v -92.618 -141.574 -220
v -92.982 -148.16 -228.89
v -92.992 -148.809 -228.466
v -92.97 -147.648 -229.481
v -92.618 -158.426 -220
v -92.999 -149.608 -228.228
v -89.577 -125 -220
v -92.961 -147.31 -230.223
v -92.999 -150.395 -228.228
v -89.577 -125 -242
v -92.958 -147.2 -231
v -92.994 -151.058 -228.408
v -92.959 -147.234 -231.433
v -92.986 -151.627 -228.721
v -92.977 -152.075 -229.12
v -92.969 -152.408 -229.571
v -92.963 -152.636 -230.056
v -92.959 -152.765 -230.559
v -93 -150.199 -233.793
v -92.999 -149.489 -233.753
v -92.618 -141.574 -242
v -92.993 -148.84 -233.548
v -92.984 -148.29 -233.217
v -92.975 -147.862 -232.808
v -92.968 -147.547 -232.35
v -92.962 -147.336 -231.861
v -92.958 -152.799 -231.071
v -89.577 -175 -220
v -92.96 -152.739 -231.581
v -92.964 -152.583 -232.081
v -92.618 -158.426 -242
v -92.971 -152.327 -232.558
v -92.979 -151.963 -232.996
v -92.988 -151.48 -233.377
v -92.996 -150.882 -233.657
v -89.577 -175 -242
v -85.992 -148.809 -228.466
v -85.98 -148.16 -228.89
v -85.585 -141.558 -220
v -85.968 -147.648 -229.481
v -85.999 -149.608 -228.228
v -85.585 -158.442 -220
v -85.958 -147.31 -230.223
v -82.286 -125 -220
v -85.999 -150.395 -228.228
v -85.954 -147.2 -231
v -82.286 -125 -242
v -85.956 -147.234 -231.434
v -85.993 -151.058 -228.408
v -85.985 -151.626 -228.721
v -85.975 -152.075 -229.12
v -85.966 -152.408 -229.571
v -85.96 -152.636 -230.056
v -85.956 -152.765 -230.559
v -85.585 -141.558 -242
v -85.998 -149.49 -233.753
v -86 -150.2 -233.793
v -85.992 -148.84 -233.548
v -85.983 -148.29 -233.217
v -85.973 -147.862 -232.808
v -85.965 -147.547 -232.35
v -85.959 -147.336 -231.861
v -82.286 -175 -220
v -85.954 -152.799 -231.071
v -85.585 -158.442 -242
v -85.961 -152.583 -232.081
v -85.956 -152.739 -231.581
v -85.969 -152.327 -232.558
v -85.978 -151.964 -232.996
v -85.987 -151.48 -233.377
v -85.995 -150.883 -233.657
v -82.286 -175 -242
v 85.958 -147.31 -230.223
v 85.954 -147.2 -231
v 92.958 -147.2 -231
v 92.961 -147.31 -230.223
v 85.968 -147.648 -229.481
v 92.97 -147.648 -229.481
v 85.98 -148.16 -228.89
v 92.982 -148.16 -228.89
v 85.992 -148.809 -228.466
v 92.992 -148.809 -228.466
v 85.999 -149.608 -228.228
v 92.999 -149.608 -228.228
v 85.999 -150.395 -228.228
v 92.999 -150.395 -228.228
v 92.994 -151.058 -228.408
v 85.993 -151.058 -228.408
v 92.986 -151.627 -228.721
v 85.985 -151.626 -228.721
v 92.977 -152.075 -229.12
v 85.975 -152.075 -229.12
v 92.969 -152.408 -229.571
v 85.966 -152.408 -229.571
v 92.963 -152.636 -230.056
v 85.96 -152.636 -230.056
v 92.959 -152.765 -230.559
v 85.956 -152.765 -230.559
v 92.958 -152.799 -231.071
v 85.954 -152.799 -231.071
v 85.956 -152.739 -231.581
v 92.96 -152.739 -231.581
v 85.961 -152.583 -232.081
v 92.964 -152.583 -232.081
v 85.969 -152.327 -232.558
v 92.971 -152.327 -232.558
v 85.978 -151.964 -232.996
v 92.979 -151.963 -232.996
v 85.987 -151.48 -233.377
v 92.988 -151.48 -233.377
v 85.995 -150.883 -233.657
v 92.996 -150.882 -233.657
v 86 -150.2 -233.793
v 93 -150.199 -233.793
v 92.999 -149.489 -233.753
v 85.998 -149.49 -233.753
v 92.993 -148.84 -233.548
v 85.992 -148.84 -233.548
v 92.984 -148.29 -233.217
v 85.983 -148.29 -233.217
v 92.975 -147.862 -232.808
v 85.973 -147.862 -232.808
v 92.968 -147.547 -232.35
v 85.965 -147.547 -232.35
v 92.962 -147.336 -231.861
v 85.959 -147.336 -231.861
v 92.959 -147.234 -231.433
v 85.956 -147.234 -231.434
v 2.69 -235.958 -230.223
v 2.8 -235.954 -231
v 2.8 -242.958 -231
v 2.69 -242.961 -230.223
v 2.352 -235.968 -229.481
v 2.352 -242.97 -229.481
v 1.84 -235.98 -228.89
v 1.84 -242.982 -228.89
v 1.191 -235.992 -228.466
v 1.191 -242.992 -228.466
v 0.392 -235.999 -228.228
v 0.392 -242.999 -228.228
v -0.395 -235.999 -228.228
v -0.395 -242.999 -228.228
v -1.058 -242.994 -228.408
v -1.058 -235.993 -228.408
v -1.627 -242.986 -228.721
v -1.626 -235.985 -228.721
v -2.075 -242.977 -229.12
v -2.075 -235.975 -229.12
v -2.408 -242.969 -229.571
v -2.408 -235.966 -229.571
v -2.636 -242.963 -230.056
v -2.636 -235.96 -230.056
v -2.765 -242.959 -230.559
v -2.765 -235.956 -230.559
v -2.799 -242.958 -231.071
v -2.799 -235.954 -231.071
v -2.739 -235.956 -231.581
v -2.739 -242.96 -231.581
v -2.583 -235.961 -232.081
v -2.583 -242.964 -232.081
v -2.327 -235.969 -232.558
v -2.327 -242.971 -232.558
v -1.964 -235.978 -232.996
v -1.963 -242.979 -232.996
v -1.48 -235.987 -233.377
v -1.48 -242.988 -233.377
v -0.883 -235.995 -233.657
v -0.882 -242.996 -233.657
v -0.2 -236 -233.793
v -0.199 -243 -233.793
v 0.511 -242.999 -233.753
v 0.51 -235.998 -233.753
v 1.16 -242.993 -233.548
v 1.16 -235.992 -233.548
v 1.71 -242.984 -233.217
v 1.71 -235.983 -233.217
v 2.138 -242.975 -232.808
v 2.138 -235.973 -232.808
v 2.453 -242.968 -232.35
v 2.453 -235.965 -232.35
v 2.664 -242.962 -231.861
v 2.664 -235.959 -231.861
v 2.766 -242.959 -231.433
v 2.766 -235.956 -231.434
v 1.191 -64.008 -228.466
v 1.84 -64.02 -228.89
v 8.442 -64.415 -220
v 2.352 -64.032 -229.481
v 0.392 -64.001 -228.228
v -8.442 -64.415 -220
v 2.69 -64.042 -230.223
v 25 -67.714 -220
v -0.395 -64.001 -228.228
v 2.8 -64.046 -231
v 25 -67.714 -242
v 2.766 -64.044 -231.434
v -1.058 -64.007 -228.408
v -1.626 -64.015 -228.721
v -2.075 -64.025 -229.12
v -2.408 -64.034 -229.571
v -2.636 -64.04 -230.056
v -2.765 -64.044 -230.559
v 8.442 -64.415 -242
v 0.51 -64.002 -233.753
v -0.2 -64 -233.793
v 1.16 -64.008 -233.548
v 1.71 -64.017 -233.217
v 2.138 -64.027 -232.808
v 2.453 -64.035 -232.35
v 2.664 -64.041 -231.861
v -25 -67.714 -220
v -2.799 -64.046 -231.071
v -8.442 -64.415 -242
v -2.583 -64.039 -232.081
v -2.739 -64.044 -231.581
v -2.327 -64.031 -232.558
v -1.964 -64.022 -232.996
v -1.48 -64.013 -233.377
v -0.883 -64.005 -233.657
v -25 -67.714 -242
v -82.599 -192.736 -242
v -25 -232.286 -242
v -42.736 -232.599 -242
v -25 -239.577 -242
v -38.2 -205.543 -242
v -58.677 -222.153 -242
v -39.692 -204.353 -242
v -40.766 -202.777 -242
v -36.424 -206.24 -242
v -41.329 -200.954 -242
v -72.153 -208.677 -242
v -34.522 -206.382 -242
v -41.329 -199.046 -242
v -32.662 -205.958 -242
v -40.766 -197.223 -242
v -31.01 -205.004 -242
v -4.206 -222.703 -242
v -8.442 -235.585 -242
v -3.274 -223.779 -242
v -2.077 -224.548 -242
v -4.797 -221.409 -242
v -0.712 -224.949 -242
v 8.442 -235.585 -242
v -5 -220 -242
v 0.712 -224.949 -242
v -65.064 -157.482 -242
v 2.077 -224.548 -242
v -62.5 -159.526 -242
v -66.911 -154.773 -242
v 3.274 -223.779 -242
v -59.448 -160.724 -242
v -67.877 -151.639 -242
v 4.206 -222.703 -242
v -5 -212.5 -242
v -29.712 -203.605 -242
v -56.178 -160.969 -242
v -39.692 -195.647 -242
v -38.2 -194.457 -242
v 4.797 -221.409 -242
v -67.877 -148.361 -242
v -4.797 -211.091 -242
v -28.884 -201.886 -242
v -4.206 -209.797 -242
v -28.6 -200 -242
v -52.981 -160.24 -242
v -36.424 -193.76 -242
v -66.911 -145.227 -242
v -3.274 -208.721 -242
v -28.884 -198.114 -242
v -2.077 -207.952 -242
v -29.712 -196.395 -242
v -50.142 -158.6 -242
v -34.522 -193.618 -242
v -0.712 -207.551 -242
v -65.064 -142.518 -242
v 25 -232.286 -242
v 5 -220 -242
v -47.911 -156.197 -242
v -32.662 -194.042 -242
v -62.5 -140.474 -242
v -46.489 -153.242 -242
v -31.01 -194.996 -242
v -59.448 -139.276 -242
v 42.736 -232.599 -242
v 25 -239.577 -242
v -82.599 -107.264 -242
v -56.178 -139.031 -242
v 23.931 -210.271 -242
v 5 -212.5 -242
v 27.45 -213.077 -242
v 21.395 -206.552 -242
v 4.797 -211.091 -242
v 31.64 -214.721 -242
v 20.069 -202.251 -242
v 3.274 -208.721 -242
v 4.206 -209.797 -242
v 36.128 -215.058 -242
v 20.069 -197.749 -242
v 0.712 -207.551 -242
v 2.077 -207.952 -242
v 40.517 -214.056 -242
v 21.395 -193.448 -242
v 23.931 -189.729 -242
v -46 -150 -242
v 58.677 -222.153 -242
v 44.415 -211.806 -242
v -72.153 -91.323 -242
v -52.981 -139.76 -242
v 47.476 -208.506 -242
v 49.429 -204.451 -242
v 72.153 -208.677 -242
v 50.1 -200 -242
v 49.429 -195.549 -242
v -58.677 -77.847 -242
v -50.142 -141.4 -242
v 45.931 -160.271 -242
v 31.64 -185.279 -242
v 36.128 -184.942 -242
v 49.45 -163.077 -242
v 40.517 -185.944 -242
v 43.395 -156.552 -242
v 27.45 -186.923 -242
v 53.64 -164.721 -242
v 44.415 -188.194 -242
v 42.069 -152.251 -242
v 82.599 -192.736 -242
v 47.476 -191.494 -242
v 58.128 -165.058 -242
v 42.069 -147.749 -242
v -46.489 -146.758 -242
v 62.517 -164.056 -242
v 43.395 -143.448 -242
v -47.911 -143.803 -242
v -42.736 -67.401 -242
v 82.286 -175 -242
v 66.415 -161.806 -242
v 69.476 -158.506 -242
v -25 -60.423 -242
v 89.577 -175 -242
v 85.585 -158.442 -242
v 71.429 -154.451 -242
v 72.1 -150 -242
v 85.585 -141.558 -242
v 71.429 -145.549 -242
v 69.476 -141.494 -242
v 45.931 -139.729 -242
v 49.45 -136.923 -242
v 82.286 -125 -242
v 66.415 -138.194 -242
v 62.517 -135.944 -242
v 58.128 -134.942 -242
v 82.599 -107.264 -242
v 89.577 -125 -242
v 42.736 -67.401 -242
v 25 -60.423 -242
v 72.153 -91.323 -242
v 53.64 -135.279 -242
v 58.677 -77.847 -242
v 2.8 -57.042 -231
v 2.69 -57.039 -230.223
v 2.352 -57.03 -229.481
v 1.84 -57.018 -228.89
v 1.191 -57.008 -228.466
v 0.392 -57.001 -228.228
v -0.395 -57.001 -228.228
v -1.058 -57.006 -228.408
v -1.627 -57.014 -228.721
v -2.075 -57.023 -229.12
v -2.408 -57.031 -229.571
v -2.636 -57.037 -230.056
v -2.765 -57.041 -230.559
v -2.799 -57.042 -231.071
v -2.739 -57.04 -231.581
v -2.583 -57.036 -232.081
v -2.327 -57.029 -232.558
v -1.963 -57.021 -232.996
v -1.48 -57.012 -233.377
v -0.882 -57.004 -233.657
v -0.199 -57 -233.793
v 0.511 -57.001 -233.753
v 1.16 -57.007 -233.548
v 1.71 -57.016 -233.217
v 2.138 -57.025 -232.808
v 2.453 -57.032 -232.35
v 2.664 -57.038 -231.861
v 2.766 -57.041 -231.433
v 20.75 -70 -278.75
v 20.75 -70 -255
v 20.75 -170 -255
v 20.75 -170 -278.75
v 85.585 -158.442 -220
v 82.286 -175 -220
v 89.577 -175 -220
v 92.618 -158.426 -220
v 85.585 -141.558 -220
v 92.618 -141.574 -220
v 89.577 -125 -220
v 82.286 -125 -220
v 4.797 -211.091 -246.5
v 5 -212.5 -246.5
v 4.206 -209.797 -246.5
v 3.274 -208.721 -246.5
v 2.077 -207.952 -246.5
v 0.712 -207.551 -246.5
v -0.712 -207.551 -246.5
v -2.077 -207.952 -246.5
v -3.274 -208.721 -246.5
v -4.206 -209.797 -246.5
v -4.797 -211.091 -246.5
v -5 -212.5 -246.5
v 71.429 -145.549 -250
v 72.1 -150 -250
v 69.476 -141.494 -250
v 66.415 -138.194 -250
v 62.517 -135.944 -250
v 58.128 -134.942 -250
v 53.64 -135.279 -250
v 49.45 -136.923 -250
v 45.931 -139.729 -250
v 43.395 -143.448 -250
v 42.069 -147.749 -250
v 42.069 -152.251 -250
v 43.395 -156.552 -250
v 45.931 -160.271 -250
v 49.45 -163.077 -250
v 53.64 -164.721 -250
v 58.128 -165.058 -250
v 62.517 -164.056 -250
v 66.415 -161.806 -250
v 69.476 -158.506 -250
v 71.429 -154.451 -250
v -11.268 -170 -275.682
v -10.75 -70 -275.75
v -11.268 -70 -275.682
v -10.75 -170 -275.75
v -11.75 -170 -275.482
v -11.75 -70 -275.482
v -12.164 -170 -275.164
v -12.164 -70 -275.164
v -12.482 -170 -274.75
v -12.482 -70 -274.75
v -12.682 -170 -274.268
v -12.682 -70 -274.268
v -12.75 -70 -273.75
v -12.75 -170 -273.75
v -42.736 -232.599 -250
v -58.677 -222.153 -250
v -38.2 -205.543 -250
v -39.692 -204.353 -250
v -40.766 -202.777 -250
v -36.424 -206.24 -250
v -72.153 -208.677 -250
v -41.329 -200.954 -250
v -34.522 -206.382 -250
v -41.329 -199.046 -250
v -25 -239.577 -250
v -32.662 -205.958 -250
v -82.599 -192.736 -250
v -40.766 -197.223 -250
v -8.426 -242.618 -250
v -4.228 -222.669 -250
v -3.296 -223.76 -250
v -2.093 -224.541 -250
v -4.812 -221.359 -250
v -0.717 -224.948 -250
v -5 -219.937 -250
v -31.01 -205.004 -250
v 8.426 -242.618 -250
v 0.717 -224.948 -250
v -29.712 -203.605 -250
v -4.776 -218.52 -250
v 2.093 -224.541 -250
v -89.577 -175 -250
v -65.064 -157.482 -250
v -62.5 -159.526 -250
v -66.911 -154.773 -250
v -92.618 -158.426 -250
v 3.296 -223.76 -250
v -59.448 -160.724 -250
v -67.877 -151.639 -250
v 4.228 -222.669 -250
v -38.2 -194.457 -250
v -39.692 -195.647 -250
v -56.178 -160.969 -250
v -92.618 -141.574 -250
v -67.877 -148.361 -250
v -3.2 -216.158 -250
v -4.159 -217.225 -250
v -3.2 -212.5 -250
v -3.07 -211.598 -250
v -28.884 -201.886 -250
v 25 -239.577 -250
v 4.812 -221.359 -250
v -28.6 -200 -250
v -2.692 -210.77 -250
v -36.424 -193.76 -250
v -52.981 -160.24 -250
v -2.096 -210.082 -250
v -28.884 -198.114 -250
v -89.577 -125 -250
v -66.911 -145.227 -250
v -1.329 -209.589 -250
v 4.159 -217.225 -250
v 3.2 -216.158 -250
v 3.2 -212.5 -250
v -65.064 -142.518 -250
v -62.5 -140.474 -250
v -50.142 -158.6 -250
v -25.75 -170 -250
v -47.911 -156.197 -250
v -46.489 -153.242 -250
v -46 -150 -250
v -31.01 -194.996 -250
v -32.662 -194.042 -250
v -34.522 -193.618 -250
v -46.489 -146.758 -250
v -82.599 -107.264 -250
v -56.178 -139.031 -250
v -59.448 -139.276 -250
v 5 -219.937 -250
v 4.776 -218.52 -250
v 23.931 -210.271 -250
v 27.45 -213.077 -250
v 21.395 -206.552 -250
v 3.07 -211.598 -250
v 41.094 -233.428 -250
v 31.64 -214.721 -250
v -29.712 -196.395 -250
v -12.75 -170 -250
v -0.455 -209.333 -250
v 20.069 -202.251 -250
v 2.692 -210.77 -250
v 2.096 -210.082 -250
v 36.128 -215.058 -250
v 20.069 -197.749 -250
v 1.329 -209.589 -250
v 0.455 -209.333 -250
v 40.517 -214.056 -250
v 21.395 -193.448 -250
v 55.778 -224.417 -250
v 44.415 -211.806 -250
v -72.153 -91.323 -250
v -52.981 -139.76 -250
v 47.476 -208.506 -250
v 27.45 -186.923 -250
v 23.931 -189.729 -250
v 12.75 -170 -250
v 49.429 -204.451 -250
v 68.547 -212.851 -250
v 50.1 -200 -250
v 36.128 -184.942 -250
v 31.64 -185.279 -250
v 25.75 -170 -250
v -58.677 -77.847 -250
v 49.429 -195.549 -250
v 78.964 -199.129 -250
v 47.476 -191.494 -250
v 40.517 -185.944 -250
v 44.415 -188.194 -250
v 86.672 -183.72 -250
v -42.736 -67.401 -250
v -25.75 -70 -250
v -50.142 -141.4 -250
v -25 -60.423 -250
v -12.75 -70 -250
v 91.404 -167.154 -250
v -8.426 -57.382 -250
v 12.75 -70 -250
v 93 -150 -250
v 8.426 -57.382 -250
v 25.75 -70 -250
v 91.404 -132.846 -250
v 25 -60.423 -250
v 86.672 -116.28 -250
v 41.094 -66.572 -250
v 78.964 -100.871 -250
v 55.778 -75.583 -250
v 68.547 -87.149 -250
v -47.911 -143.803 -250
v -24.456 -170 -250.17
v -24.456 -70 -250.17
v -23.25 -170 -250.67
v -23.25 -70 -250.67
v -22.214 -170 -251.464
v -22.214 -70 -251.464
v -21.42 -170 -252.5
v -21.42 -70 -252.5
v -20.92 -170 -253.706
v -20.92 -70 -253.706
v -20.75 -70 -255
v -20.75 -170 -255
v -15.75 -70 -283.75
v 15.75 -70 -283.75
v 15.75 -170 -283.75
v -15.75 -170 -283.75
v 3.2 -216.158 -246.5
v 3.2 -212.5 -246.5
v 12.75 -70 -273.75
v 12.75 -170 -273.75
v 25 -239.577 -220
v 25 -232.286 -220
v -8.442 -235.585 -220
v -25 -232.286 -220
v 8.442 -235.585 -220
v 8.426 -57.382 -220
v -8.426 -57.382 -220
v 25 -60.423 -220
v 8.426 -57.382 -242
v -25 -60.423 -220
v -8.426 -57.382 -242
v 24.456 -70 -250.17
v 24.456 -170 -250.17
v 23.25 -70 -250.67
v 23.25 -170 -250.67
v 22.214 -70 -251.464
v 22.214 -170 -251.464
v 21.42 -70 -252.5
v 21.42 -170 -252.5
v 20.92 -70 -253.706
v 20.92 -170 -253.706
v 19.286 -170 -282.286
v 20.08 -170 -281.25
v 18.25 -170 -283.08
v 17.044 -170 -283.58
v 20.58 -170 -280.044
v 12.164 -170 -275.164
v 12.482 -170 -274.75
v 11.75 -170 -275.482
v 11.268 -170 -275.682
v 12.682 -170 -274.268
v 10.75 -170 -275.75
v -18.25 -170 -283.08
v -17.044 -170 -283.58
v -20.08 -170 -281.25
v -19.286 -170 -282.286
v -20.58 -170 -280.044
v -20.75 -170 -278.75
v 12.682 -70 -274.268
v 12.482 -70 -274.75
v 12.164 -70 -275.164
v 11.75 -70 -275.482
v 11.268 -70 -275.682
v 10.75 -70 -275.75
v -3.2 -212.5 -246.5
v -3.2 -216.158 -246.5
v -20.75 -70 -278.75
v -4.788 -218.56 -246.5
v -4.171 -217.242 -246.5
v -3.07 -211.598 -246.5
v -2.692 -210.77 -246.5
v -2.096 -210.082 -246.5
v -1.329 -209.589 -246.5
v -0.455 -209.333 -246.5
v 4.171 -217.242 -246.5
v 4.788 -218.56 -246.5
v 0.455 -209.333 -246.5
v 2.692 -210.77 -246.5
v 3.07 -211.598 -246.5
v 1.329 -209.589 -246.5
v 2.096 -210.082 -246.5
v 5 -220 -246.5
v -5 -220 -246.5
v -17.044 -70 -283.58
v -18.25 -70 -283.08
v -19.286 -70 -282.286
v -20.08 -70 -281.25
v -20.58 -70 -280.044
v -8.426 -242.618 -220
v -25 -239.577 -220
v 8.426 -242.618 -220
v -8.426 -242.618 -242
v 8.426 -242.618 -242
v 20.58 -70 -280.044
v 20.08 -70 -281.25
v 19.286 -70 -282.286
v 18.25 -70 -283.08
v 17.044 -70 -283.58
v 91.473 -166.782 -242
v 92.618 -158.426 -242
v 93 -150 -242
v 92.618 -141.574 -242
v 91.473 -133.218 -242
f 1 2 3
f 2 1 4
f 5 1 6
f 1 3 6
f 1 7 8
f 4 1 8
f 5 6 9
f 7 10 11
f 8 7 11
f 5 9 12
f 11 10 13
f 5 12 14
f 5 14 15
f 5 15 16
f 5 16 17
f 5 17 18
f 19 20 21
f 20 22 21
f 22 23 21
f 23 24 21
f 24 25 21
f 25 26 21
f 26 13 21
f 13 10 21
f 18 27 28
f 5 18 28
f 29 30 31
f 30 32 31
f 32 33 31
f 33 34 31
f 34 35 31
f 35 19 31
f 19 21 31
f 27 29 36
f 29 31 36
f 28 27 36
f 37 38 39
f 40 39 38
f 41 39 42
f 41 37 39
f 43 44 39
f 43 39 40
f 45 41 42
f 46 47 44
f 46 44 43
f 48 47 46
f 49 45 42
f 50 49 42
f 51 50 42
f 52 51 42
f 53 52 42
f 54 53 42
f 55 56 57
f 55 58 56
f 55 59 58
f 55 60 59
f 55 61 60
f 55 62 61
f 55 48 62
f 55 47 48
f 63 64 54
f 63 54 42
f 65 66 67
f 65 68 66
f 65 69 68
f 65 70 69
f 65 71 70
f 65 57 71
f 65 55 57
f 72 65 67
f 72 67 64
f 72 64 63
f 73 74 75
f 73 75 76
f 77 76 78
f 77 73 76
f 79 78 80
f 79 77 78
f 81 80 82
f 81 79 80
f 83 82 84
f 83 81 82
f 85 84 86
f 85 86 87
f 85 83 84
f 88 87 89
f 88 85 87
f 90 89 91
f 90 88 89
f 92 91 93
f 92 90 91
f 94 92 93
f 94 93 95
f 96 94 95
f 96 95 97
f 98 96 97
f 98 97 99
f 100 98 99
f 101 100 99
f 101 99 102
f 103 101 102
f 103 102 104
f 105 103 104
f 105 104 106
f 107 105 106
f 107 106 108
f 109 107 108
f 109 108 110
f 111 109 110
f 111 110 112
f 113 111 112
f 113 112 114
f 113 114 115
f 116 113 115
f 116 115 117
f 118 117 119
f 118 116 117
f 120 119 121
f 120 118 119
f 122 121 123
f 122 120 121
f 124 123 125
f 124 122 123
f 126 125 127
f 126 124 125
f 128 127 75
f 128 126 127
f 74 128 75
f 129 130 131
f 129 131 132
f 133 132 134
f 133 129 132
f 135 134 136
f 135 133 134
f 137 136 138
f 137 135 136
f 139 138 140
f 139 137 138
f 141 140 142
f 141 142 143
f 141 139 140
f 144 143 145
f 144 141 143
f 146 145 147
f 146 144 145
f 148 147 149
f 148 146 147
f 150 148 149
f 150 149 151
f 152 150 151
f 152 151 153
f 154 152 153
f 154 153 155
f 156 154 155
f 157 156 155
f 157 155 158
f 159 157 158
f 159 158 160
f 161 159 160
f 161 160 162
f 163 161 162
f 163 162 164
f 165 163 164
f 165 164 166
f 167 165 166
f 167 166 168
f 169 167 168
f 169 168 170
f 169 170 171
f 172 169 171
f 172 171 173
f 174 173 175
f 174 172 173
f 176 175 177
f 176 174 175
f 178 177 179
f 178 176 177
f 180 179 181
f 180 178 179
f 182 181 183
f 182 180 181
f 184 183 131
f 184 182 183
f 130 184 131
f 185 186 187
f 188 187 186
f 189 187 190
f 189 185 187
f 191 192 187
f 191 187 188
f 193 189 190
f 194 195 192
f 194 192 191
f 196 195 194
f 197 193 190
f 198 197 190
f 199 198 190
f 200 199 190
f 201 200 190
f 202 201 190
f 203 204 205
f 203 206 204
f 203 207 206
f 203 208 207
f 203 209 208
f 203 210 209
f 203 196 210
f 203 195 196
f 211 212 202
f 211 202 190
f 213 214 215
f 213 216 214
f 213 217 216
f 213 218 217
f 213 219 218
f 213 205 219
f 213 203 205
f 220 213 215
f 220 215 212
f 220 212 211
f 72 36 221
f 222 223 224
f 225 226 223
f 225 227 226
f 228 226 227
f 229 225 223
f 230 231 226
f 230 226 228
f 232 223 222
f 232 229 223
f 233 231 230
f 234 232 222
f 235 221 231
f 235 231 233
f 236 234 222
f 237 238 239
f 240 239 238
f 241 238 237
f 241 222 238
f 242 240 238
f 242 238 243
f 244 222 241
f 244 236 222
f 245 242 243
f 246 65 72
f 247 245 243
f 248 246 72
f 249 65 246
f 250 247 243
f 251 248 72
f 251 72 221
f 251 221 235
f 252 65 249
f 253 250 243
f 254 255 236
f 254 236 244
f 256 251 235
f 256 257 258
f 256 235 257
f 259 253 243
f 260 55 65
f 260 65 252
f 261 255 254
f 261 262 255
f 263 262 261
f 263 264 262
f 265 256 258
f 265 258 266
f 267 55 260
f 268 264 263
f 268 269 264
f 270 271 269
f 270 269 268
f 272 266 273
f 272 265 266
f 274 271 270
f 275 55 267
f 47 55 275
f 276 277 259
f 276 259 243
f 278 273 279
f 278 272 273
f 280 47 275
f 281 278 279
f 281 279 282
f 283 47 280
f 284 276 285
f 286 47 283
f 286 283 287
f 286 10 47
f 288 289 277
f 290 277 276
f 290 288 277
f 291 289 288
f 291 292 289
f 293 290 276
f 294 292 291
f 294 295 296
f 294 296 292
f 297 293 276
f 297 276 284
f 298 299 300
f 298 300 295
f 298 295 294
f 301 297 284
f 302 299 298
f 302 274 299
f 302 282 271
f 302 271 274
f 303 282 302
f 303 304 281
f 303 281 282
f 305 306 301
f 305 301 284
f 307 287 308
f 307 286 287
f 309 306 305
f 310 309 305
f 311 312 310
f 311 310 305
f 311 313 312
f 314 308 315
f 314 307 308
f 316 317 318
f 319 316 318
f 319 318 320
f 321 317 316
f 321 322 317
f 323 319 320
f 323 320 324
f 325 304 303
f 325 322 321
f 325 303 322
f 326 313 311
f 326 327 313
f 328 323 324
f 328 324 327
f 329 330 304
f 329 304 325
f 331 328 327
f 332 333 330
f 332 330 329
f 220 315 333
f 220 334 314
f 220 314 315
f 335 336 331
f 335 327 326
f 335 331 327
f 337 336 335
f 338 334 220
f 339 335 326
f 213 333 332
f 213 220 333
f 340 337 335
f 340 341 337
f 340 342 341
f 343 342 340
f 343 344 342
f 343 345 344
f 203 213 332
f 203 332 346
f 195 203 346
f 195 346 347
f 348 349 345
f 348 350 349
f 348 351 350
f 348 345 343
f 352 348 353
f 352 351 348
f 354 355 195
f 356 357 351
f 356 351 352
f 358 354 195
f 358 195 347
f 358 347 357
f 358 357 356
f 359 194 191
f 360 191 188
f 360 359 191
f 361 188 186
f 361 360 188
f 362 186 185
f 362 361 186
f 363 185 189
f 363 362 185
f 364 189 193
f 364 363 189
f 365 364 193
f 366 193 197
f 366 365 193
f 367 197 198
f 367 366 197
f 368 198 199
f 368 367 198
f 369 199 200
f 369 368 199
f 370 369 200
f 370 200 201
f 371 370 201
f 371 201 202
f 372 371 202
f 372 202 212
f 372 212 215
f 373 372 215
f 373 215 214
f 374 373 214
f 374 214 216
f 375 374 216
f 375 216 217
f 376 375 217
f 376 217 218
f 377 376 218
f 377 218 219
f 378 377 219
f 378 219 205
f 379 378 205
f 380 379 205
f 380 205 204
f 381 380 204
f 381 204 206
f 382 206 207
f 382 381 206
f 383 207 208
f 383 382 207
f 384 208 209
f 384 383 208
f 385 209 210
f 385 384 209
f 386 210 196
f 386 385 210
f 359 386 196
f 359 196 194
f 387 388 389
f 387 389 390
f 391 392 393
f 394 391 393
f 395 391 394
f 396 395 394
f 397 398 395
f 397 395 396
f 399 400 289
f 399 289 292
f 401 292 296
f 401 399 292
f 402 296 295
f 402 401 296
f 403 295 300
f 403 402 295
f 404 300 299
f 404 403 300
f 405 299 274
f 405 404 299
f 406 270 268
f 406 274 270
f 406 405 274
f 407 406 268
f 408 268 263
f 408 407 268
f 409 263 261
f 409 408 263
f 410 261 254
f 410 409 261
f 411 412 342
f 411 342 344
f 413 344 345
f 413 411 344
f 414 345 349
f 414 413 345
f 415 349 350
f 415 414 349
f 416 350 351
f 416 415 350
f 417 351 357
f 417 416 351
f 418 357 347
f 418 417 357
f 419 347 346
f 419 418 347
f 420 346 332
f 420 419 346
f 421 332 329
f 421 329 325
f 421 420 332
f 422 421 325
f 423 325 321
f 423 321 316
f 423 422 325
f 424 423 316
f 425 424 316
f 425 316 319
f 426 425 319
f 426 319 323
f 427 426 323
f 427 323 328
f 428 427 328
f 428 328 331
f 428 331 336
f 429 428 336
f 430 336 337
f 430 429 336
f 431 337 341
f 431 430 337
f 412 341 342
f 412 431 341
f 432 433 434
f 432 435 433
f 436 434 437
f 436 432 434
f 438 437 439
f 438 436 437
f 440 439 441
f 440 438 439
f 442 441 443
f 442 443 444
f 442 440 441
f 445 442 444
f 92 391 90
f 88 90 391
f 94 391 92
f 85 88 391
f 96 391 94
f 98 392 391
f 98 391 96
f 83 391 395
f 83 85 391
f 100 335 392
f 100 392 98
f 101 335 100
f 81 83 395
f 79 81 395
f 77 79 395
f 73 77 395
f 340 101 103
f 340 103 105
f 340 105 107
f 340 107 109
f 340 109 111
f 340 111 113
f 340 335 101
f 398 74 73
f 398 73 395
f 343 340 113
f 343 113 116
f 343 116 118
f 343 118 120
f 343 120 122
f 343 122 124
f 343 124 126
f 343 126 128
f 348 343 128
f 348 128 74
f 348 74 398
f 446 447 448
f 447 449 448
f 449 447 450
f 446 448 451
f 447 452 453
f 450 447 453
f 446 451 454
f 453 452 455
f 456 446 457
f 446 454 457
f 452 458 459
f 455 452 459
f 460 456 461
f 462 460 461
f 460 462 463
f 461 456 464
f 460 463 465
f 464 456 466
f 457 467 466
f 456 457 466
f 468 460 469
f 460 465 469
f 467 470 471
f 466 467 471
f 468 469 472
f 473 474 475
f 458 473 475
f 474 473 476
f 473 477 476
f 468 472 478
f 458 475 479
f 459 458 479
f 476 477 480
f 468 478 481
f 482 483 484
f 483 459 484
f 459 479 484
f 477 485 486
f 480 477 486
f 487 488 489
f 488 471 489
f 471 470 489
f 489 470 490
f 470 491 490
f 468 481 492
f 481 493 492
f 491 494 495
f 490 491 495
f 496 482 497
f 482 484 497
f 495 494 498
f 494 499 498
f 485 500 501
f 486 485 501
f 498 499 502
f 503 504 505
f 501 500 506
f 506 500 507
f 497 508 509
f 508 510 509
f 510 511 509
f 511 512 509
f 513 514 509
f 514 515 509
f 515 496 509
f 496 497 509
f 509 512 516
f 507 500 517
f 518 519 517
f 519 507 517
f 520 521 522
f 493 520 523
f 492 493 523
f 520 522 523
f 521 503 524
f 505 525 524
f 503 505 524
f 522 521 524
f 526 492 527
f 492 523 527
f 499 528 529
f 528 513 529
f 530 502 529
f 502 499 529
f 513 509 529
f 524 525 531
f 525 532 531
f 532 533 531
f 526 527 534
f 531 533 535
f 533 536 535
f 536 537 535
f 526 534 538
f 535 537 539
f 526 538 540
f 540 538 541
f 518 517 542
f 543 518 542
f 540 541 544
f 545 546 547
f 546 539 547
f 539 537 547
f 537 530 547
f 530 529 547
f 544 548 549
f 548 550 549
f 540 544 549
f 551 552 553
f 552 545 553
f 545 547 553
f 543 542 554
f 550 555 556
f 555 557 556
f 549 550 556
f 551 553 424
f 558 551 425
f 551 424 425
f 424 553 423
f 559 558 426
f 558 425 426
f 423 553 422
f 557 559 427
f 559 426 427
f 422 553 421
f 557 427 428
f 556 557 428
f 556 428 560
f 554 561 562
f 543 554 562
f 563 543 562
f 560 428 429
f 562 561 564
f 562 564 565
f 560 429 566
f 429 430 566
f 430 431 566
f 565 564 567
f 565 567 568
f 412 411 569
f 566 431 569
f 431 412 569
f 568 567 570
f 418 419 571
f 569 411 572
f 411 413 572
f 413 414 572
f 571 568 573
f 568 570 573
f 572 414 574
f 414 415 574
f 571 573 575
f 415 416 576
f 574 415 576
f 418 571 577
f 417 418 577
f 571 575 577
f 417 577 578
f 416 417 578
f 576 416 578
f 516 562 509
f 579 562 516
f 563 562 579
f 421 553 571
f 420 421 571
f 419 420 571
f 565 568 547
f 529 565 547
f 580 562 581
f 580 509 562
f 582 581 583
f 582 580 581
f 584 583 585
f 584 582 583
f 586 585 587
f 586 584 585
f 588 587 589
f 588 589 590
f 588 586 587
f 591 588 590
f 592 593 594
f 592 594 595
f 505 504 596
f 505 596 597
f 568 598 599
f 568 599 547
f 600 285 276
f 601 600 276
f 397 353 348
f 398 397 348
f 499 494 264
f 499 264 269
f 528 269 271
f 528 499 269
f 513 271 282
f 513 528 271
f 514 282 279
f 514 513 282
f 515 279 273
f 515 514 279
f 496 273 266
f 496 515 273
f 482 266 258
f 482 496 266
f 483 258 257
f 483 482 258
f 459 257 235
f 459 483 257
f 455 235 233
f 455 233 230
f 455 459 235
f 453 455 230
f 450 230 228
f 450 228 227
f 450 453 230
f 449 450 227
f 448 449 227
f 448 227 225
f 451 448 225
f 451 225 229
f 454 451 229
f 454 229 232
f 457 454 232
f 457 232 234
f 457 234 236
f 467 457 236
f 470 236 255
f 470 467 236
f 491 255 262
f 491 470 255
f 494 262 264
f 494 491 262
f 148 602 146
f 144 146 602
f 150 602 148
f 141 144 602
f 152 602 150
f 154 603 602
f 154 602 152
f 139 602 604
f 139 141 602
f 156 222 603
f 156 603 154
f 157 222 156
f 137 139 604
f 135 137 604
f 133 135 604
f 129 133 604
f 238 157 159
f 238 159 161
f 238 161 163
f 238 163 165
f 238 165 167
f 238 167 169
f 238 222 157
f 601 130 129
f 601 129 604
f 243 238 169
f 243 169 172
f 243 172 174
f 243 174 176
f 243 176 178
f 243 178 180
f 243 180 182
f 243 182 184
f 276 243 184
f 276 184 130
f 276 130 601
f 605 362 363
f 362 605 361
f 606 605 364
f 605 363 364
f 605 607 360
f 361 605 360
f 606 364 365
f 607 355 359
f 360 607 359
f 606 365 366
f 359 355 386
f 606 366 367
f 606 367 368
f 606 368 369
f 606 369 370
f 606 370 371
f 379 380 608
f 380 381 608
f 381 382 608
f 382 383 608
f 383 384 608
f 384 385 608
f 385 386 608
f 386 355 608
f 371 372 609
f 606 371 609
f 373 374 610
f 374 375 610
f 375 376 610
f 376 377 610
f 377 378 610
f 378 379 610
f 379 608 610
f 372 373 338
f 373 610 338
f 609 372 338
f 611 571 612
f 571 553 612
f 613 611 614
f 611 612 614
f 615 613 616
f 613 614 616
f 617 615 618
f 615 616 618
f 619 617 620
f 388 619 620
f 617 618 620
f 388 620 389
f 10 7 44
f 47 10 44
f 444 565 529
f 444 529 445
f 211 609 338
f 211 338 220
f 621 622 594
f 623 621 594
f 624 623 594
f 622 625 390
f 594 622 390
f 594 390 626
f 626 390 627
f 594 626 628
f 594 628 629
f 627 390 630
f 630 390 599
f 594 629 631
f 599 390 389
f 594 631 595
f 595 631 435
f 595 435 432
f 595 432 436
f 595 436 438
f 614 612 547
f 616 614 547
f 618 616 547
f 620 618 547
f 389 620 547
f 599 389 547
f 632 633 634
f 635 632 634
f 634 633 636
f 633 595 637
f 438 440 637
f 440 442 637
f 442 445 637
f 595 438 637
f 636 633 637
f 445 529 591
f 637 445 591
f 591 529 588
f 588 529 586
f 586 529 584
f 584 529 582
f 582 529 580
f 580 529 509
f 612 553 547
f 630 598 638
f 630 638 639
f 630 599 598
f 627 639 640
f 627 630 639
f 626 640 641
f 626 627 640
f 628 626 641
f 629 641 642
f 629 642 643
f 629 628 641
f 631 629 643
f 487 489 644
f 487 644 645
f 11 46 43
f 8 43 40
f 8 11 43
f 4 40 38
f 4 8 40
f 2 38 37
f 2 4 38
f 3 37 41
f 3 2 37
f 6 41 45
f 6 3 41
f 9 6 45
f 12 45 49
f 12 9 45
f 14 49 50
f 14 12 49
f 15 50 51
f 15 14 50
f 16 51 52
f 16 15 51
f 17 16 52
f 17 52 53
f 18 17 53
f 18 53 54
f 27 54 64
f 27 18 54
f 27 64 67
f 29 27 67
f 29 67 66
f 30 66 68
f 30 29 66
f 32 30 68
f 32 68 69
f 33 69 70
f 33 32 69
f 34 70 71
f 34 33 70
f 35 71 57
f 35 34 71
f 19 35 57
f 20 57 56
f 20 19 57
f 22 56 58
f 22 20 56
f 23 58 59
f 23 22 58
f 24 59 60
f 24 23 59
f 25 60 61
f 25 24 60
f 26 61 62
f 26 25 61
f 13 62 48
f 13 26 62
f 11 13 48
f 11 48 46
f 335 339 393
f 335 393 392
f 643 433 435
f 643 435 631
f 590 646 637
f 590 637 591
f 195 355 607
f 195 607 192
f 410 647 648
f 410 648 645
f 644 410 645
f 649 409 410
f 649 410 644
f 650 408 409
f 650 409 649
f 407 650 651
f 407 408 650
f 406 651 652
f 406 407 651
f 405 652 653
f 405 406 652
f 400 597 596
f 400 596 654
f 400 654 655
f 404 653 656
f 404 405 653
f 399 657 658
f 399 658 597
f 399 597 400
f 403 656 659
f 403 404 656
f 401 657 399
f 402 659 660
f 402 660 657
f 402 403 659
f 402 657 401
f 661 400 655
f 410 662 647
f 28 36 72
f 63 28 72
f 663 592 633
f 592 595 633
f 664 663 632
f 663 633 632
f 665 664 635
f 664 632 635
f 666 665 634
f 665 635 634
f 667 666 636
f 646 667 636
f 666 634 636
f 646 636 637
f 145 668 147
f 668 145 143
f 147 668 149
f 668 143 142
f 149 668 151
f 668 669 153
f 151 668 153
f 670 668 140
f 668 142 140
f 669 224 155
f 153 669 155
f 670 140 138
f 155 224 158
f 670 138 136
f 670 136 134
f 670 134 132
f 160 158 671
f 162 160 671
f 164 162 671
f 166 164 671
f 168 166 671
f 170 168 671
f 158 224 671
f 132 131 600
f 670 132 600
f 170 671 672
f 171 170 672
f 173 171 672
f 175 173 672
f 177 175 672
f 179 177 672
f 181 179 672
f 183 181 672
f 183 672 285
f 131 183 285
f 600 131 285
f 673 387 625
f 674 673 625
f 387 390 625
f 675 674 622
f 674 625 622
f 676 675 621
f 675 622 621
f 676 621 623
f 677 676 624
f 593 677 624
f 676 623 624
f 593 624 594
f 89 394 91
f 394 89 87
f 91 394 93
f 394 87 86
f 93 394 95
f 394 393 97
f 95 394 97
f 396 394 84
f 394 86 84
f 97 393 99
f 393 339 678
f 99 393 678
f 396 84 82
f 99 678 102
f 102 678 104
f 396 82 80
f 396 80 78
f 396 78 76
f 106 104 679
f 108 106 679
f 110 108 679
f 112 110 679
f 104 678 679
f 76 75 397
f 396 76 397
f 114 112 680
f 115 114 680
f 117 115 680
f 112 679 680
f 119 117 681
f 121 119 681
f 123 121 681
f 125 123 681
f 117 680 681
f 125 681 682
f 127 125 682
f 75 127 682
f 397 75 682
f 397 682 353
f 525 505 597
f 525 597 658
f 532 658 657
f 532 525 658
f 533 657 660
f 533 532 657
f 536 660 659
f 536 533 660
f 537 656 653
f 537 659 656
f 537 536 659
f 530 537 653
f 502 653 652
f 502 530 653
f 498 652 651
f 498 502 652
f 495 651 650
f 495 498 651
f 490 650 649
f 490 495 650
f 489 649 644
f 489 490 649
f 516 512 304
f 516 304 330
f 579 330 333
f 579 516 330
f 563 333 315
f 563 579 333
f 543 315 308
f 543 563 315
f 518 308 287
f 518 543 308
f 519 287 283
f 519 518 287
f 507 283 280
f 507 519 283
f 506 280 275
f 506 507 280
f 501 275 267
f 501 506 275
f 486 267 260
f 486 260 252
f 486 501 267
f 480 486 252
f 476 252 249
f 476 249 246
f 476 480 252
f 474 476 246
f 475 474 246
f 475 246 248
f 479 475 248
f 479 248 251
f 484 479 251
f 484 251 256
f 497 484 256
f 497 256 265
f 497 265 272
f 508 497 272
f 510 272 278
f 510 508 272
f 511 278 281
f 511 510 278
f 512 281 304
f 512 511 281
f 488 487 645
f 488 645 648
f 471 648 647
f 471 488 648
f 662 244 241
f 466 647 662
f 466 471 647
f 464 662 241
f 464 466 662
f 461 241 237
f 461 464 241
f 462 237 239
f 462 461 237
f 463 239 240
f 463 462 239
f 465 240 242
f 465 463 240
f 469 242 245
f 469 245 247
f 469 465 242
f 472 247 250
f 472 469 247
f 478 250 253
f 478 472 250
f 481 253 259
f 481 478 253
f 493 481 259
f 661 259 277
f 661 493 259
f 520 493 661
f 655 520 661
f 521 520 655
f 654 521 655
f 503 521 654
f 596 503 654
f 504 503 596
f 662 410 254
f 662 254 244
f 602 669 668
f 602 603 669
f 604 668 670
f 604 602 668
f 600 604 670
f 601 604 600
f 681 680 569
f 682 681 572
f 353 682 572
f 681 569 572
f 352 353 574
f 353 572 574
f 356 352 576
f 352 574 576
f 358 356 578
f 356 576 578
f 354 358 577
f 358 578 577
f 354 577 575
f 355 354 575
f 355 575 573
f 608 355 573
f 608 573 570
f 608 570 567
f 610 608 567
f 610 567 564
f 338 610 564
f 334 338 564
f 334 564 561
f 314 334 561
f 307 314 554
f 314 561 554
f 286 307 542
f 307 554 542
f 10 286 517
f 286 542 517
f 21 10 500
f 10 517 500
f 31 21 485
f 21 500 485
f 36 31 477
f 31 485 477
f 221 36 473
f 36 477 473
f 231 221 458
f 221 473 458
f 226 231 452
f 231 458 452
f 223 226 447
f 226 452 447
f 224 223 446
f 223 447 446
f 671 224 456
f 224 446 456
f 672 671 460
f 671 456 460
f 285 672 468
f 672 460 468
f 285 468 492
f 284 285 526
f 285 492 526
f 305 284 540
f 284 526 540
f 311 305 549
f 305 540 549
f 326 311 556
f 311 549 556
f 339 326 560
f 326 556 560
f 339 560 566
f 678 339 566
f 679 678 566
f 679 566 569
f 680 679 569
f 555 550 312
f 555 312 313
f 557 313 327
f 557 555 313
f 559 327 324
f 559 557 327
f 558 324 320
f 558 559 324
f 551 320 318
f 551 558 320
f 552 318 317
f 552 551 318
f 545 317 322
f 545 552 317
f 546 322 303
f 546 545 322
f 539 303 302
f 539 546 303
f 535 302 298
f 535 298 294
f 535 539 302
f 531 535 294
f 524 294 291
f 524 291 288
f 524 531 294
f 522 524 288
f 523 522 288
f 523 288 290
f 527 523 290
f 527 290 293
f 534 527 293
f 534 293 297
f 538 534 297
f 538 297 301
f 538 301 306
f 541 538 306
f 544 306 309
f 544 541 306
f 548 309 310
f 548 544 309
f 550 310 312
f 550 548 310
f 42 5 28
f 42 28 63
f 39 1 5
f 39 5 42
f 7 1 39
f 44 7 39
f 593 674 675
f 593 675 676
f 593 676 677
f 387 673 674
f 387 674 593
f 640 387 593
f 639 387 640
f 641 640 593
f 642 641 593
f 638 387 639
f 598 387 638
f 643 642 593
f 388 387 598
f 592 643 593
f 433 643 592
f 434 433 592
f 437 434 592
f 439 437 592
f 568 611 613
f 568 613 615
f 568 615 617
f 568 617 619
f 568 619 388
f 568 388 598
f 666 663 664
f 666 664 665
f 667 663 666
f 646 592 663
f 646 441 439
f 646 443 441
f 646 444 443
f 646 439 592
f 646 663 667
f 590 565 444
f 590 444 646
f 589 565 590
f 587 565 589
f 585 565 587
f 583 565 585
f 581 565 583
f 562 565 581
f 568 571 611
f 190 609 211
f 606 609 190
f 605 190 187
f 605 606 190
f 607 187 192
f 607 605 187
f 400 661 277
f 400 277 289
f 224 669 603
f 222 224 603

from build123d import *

# Parameters (mm, degrees)
EXTRUDE020_DEPTH  = 10
CYLINDER133_R     = 2.8
CYLINDER133_DEPTH = 300
CYLINDER134_R     = 2.8
CYLINDER134_DEPTH = 300
EXTRUDE023_DEPTH  = 30
SKETCH037_R       = 93
SKETCH037_R_2     = 11
SKETCH037_R_3     = 15.1
SKETCH037_R_4     = 6.4
EXTRUDE019_DEPTH  = 8
EXTRUDE036_DEPTH  = 100
FILLET008_R       = 5
FILLET009_R       = 2
FILLET010_R       = 5


with BuildPart() as miccutlevel5:
    # Sketch038 → Extrude020 (new body)
    with BuildSketch(Plane.XY):
        with BuildLine():
            ThreePointArc((-5, -220), (0, -225), (5, -220))
            Line((5, -220), (5, -212.5))
            ThreePointArc((5, -212.5), (0, -207.5), (-5, -212.5))
            Line((-5, -212.5), (-5, -220))
        make_face()
    extrude(amount=EXTRUDE020_DEPTH)


with BuildPart() as miccutlevel5_1:
    # Extrude020 placement: moved
    add(miccutlevel5.part.moved(Location((0, 0, -246.5))))


with BuildPart() as cylinder133:
    # Cylinder133 → Cylinder133 (new body)
    with BuildSketch(Plane(origin=(0, 0, 90), x_dir=(1, 0, 0), z_dir=(0, -1, 0))):
        Circle(CYLINDER133_R)
    extrude(amount=CYLINDER133_DEPTH)


with BuildPart() as m4heatsetcuts001:
    # Cylinder134 → Cylinder134 (new body)
    with BuildSketch(Plane(origin=(-150, -150, 90), x_dir=(0, 1, 0), z_dir=(1, 0, 0))):
        Circle(CYLINDER134_R)
    extrude(amount=CYLINDER134_DEPTH)

    # Fusion085: union Cylinder133
    add(cylinder133.part)


with BuildPart() as m4heatsetcuts001_1:
    # Fusion085 placement: moved
    add(m4heatsetcuts001.part.moved(Location((0, 0, -321))))


with BuildPart() as srsholdslevel5:
    # Sketch041 → Extrude023 (new body)
    with BuildSketch(Plane.XY):
        with BuildLine():
            ThreePointArc((-89.576783, -125), (-93, -150), (-89.576783, -175))
            Line((-89.576783, -175), (-82.286086, -175))
            ThreePointArc((-82.286086, -125), (-86, -150), (-82.286086, -175))
            Line((-89.576783, -125), (-82.286086, -125))
        make_face()
        with BuildLine():
            ThreePointArc((25, -60.423217), (0, -57), (-25, -60.423217))
            Line((-25, -60.423217), (-25, -67.713914))
            ThreePointArc((25, -67.713914), (0, -64), (-25, -67.713914))
            Line((25, -60.423217), (25, -67.713914))
        make_face()
        with BuildLine():
            ThreePointArc((89.576783, -175), (93, -150), (89.576783, -125))
            Line((89.576783, -125), (82.286086, -125))
            ThreePointArc((82.286086, -175), (86, -150), (82.286086, -125))
            Line((89.576783, -175), (82.286086, -175))
        make_face()
        with BuildLine():
            ThreePointArc((-25, -239.576783), (0, -243), (25, -239.576783))
            Line((25, -239.576783), (25, -232.286086))
            ThreePointArc((-25, -232.286086), (0, -236), (25, -232.286086))
            Line((-25, -239.576783), (-25, -232.286086))
        make_face()
    extrude(amount=EXTRUDE023_DEPTH)


with BuildPart() as srsholdslevel5_1:
    # Extrude023 placement: moved
    add(srsholdslevel5.part.moved(Location((0, 0, -250))))


with BuildPart() as level5s:
    # Sketch037 → Extrude019 (new body)
    with BuildSketch(Plane.XY):
        with Locations((0, -150)):
            Circle(SKETCH037_R)
        with Locations((-57, -150)):
            Circle(SKETCH037_R_2, mode=Mode.SUBTRACT)
        with Locations((57, -150)):
            Circle(SKETCH037_R_3, mode=Mode.SUBTRACT)
        with Locations((35, -200)):
            Circle(SKETCH037_R_3, mode=Mode.SUBTRACT)
        with Locations((-35, -200)):
            Circle(SKETCH037_R_4, mode=Mode.SUBTRACT)
        with BuildLine():
            ThreePointArc((-3.2, -216.158125), (0, -225), (3.2, -216.158125))
            Line((3.2, -216.158125), (3.2, -212.5))
            ThreePointArc((3.2, -212.5), (0, -209.3), (-3.2, -212.5))
            Line((-3.2, -212.5), (-3.2, -216.158125))
        make_face(mode=Mode.SUBTRACT)
    extrude(amount=EXTRUDE019_DEPTH)


with BuildPart() as level5s_1:
    # Extrude019 placement: moved
    add(level5s.part.moved(Location((0, 0, -250))))

    # Fusion083: union srsHoldsLevel5
    add(srsholdslevel5_1.part)

    # Cut035: cut m4HeatSetCuts001
    add(m4heatsetcuts001_1.part, mode=Mode.SUBTRACT)

    # Cut041: cut micCutLevel5
    add(miccutlevel5_1.part, mode=Mode.SUBTRACT)


with BuildPart() as fillet010:
    # Sketch054 → Extrude036 (new body)
    with BuildSketch(Plane.XZ):
        Polygon((-20.75, -250), (-12.75, -250), (-12.75, -275.75), (12.75, -275.75), (12.75, -250), (20.75, -250), (20.75, -283.75), (-20.75, -283.75), align=None)
    extrude(amount=EXTRUDE036_DEPTH)


with BuildPart() as fillet010_1:
    # Extrude036 placement: moved
    add(fillet010.part.moved(Location((0, -70, 0))))

    # Fillet008
    fillet008_edges = [fillet010_1.edges().sort_by_distance(p)[0] for p in [
        (20.75, -120, -283.75),
        (-20.75, -120, -283.75),
    ]]
    fillet(fillet008_edges, radius=FILLET008_R)

    # Fillet009
    fillet009_edges = [fillet010_1.edges().sort_by_distance(p)[0] for p in [
        (12.75, -120, -275.75),
        (-12.75, -120, -275.75),
    ]]
    fillet(fillet009_edges, radius=FILLET009_R)

    # Fusion104: union level5s
    add(level5s_1.part)

    # Fillet010
    fillet010_edges = [fillet010_1.edges().sort_by_distance(p)[0] for p in [
        (-20.75, -120, -250),
        (20.75, -120, -250),
    ]]
    fillet(fillet010_edges, radius=FILLET010_R)


solid = fillet010_1.part
